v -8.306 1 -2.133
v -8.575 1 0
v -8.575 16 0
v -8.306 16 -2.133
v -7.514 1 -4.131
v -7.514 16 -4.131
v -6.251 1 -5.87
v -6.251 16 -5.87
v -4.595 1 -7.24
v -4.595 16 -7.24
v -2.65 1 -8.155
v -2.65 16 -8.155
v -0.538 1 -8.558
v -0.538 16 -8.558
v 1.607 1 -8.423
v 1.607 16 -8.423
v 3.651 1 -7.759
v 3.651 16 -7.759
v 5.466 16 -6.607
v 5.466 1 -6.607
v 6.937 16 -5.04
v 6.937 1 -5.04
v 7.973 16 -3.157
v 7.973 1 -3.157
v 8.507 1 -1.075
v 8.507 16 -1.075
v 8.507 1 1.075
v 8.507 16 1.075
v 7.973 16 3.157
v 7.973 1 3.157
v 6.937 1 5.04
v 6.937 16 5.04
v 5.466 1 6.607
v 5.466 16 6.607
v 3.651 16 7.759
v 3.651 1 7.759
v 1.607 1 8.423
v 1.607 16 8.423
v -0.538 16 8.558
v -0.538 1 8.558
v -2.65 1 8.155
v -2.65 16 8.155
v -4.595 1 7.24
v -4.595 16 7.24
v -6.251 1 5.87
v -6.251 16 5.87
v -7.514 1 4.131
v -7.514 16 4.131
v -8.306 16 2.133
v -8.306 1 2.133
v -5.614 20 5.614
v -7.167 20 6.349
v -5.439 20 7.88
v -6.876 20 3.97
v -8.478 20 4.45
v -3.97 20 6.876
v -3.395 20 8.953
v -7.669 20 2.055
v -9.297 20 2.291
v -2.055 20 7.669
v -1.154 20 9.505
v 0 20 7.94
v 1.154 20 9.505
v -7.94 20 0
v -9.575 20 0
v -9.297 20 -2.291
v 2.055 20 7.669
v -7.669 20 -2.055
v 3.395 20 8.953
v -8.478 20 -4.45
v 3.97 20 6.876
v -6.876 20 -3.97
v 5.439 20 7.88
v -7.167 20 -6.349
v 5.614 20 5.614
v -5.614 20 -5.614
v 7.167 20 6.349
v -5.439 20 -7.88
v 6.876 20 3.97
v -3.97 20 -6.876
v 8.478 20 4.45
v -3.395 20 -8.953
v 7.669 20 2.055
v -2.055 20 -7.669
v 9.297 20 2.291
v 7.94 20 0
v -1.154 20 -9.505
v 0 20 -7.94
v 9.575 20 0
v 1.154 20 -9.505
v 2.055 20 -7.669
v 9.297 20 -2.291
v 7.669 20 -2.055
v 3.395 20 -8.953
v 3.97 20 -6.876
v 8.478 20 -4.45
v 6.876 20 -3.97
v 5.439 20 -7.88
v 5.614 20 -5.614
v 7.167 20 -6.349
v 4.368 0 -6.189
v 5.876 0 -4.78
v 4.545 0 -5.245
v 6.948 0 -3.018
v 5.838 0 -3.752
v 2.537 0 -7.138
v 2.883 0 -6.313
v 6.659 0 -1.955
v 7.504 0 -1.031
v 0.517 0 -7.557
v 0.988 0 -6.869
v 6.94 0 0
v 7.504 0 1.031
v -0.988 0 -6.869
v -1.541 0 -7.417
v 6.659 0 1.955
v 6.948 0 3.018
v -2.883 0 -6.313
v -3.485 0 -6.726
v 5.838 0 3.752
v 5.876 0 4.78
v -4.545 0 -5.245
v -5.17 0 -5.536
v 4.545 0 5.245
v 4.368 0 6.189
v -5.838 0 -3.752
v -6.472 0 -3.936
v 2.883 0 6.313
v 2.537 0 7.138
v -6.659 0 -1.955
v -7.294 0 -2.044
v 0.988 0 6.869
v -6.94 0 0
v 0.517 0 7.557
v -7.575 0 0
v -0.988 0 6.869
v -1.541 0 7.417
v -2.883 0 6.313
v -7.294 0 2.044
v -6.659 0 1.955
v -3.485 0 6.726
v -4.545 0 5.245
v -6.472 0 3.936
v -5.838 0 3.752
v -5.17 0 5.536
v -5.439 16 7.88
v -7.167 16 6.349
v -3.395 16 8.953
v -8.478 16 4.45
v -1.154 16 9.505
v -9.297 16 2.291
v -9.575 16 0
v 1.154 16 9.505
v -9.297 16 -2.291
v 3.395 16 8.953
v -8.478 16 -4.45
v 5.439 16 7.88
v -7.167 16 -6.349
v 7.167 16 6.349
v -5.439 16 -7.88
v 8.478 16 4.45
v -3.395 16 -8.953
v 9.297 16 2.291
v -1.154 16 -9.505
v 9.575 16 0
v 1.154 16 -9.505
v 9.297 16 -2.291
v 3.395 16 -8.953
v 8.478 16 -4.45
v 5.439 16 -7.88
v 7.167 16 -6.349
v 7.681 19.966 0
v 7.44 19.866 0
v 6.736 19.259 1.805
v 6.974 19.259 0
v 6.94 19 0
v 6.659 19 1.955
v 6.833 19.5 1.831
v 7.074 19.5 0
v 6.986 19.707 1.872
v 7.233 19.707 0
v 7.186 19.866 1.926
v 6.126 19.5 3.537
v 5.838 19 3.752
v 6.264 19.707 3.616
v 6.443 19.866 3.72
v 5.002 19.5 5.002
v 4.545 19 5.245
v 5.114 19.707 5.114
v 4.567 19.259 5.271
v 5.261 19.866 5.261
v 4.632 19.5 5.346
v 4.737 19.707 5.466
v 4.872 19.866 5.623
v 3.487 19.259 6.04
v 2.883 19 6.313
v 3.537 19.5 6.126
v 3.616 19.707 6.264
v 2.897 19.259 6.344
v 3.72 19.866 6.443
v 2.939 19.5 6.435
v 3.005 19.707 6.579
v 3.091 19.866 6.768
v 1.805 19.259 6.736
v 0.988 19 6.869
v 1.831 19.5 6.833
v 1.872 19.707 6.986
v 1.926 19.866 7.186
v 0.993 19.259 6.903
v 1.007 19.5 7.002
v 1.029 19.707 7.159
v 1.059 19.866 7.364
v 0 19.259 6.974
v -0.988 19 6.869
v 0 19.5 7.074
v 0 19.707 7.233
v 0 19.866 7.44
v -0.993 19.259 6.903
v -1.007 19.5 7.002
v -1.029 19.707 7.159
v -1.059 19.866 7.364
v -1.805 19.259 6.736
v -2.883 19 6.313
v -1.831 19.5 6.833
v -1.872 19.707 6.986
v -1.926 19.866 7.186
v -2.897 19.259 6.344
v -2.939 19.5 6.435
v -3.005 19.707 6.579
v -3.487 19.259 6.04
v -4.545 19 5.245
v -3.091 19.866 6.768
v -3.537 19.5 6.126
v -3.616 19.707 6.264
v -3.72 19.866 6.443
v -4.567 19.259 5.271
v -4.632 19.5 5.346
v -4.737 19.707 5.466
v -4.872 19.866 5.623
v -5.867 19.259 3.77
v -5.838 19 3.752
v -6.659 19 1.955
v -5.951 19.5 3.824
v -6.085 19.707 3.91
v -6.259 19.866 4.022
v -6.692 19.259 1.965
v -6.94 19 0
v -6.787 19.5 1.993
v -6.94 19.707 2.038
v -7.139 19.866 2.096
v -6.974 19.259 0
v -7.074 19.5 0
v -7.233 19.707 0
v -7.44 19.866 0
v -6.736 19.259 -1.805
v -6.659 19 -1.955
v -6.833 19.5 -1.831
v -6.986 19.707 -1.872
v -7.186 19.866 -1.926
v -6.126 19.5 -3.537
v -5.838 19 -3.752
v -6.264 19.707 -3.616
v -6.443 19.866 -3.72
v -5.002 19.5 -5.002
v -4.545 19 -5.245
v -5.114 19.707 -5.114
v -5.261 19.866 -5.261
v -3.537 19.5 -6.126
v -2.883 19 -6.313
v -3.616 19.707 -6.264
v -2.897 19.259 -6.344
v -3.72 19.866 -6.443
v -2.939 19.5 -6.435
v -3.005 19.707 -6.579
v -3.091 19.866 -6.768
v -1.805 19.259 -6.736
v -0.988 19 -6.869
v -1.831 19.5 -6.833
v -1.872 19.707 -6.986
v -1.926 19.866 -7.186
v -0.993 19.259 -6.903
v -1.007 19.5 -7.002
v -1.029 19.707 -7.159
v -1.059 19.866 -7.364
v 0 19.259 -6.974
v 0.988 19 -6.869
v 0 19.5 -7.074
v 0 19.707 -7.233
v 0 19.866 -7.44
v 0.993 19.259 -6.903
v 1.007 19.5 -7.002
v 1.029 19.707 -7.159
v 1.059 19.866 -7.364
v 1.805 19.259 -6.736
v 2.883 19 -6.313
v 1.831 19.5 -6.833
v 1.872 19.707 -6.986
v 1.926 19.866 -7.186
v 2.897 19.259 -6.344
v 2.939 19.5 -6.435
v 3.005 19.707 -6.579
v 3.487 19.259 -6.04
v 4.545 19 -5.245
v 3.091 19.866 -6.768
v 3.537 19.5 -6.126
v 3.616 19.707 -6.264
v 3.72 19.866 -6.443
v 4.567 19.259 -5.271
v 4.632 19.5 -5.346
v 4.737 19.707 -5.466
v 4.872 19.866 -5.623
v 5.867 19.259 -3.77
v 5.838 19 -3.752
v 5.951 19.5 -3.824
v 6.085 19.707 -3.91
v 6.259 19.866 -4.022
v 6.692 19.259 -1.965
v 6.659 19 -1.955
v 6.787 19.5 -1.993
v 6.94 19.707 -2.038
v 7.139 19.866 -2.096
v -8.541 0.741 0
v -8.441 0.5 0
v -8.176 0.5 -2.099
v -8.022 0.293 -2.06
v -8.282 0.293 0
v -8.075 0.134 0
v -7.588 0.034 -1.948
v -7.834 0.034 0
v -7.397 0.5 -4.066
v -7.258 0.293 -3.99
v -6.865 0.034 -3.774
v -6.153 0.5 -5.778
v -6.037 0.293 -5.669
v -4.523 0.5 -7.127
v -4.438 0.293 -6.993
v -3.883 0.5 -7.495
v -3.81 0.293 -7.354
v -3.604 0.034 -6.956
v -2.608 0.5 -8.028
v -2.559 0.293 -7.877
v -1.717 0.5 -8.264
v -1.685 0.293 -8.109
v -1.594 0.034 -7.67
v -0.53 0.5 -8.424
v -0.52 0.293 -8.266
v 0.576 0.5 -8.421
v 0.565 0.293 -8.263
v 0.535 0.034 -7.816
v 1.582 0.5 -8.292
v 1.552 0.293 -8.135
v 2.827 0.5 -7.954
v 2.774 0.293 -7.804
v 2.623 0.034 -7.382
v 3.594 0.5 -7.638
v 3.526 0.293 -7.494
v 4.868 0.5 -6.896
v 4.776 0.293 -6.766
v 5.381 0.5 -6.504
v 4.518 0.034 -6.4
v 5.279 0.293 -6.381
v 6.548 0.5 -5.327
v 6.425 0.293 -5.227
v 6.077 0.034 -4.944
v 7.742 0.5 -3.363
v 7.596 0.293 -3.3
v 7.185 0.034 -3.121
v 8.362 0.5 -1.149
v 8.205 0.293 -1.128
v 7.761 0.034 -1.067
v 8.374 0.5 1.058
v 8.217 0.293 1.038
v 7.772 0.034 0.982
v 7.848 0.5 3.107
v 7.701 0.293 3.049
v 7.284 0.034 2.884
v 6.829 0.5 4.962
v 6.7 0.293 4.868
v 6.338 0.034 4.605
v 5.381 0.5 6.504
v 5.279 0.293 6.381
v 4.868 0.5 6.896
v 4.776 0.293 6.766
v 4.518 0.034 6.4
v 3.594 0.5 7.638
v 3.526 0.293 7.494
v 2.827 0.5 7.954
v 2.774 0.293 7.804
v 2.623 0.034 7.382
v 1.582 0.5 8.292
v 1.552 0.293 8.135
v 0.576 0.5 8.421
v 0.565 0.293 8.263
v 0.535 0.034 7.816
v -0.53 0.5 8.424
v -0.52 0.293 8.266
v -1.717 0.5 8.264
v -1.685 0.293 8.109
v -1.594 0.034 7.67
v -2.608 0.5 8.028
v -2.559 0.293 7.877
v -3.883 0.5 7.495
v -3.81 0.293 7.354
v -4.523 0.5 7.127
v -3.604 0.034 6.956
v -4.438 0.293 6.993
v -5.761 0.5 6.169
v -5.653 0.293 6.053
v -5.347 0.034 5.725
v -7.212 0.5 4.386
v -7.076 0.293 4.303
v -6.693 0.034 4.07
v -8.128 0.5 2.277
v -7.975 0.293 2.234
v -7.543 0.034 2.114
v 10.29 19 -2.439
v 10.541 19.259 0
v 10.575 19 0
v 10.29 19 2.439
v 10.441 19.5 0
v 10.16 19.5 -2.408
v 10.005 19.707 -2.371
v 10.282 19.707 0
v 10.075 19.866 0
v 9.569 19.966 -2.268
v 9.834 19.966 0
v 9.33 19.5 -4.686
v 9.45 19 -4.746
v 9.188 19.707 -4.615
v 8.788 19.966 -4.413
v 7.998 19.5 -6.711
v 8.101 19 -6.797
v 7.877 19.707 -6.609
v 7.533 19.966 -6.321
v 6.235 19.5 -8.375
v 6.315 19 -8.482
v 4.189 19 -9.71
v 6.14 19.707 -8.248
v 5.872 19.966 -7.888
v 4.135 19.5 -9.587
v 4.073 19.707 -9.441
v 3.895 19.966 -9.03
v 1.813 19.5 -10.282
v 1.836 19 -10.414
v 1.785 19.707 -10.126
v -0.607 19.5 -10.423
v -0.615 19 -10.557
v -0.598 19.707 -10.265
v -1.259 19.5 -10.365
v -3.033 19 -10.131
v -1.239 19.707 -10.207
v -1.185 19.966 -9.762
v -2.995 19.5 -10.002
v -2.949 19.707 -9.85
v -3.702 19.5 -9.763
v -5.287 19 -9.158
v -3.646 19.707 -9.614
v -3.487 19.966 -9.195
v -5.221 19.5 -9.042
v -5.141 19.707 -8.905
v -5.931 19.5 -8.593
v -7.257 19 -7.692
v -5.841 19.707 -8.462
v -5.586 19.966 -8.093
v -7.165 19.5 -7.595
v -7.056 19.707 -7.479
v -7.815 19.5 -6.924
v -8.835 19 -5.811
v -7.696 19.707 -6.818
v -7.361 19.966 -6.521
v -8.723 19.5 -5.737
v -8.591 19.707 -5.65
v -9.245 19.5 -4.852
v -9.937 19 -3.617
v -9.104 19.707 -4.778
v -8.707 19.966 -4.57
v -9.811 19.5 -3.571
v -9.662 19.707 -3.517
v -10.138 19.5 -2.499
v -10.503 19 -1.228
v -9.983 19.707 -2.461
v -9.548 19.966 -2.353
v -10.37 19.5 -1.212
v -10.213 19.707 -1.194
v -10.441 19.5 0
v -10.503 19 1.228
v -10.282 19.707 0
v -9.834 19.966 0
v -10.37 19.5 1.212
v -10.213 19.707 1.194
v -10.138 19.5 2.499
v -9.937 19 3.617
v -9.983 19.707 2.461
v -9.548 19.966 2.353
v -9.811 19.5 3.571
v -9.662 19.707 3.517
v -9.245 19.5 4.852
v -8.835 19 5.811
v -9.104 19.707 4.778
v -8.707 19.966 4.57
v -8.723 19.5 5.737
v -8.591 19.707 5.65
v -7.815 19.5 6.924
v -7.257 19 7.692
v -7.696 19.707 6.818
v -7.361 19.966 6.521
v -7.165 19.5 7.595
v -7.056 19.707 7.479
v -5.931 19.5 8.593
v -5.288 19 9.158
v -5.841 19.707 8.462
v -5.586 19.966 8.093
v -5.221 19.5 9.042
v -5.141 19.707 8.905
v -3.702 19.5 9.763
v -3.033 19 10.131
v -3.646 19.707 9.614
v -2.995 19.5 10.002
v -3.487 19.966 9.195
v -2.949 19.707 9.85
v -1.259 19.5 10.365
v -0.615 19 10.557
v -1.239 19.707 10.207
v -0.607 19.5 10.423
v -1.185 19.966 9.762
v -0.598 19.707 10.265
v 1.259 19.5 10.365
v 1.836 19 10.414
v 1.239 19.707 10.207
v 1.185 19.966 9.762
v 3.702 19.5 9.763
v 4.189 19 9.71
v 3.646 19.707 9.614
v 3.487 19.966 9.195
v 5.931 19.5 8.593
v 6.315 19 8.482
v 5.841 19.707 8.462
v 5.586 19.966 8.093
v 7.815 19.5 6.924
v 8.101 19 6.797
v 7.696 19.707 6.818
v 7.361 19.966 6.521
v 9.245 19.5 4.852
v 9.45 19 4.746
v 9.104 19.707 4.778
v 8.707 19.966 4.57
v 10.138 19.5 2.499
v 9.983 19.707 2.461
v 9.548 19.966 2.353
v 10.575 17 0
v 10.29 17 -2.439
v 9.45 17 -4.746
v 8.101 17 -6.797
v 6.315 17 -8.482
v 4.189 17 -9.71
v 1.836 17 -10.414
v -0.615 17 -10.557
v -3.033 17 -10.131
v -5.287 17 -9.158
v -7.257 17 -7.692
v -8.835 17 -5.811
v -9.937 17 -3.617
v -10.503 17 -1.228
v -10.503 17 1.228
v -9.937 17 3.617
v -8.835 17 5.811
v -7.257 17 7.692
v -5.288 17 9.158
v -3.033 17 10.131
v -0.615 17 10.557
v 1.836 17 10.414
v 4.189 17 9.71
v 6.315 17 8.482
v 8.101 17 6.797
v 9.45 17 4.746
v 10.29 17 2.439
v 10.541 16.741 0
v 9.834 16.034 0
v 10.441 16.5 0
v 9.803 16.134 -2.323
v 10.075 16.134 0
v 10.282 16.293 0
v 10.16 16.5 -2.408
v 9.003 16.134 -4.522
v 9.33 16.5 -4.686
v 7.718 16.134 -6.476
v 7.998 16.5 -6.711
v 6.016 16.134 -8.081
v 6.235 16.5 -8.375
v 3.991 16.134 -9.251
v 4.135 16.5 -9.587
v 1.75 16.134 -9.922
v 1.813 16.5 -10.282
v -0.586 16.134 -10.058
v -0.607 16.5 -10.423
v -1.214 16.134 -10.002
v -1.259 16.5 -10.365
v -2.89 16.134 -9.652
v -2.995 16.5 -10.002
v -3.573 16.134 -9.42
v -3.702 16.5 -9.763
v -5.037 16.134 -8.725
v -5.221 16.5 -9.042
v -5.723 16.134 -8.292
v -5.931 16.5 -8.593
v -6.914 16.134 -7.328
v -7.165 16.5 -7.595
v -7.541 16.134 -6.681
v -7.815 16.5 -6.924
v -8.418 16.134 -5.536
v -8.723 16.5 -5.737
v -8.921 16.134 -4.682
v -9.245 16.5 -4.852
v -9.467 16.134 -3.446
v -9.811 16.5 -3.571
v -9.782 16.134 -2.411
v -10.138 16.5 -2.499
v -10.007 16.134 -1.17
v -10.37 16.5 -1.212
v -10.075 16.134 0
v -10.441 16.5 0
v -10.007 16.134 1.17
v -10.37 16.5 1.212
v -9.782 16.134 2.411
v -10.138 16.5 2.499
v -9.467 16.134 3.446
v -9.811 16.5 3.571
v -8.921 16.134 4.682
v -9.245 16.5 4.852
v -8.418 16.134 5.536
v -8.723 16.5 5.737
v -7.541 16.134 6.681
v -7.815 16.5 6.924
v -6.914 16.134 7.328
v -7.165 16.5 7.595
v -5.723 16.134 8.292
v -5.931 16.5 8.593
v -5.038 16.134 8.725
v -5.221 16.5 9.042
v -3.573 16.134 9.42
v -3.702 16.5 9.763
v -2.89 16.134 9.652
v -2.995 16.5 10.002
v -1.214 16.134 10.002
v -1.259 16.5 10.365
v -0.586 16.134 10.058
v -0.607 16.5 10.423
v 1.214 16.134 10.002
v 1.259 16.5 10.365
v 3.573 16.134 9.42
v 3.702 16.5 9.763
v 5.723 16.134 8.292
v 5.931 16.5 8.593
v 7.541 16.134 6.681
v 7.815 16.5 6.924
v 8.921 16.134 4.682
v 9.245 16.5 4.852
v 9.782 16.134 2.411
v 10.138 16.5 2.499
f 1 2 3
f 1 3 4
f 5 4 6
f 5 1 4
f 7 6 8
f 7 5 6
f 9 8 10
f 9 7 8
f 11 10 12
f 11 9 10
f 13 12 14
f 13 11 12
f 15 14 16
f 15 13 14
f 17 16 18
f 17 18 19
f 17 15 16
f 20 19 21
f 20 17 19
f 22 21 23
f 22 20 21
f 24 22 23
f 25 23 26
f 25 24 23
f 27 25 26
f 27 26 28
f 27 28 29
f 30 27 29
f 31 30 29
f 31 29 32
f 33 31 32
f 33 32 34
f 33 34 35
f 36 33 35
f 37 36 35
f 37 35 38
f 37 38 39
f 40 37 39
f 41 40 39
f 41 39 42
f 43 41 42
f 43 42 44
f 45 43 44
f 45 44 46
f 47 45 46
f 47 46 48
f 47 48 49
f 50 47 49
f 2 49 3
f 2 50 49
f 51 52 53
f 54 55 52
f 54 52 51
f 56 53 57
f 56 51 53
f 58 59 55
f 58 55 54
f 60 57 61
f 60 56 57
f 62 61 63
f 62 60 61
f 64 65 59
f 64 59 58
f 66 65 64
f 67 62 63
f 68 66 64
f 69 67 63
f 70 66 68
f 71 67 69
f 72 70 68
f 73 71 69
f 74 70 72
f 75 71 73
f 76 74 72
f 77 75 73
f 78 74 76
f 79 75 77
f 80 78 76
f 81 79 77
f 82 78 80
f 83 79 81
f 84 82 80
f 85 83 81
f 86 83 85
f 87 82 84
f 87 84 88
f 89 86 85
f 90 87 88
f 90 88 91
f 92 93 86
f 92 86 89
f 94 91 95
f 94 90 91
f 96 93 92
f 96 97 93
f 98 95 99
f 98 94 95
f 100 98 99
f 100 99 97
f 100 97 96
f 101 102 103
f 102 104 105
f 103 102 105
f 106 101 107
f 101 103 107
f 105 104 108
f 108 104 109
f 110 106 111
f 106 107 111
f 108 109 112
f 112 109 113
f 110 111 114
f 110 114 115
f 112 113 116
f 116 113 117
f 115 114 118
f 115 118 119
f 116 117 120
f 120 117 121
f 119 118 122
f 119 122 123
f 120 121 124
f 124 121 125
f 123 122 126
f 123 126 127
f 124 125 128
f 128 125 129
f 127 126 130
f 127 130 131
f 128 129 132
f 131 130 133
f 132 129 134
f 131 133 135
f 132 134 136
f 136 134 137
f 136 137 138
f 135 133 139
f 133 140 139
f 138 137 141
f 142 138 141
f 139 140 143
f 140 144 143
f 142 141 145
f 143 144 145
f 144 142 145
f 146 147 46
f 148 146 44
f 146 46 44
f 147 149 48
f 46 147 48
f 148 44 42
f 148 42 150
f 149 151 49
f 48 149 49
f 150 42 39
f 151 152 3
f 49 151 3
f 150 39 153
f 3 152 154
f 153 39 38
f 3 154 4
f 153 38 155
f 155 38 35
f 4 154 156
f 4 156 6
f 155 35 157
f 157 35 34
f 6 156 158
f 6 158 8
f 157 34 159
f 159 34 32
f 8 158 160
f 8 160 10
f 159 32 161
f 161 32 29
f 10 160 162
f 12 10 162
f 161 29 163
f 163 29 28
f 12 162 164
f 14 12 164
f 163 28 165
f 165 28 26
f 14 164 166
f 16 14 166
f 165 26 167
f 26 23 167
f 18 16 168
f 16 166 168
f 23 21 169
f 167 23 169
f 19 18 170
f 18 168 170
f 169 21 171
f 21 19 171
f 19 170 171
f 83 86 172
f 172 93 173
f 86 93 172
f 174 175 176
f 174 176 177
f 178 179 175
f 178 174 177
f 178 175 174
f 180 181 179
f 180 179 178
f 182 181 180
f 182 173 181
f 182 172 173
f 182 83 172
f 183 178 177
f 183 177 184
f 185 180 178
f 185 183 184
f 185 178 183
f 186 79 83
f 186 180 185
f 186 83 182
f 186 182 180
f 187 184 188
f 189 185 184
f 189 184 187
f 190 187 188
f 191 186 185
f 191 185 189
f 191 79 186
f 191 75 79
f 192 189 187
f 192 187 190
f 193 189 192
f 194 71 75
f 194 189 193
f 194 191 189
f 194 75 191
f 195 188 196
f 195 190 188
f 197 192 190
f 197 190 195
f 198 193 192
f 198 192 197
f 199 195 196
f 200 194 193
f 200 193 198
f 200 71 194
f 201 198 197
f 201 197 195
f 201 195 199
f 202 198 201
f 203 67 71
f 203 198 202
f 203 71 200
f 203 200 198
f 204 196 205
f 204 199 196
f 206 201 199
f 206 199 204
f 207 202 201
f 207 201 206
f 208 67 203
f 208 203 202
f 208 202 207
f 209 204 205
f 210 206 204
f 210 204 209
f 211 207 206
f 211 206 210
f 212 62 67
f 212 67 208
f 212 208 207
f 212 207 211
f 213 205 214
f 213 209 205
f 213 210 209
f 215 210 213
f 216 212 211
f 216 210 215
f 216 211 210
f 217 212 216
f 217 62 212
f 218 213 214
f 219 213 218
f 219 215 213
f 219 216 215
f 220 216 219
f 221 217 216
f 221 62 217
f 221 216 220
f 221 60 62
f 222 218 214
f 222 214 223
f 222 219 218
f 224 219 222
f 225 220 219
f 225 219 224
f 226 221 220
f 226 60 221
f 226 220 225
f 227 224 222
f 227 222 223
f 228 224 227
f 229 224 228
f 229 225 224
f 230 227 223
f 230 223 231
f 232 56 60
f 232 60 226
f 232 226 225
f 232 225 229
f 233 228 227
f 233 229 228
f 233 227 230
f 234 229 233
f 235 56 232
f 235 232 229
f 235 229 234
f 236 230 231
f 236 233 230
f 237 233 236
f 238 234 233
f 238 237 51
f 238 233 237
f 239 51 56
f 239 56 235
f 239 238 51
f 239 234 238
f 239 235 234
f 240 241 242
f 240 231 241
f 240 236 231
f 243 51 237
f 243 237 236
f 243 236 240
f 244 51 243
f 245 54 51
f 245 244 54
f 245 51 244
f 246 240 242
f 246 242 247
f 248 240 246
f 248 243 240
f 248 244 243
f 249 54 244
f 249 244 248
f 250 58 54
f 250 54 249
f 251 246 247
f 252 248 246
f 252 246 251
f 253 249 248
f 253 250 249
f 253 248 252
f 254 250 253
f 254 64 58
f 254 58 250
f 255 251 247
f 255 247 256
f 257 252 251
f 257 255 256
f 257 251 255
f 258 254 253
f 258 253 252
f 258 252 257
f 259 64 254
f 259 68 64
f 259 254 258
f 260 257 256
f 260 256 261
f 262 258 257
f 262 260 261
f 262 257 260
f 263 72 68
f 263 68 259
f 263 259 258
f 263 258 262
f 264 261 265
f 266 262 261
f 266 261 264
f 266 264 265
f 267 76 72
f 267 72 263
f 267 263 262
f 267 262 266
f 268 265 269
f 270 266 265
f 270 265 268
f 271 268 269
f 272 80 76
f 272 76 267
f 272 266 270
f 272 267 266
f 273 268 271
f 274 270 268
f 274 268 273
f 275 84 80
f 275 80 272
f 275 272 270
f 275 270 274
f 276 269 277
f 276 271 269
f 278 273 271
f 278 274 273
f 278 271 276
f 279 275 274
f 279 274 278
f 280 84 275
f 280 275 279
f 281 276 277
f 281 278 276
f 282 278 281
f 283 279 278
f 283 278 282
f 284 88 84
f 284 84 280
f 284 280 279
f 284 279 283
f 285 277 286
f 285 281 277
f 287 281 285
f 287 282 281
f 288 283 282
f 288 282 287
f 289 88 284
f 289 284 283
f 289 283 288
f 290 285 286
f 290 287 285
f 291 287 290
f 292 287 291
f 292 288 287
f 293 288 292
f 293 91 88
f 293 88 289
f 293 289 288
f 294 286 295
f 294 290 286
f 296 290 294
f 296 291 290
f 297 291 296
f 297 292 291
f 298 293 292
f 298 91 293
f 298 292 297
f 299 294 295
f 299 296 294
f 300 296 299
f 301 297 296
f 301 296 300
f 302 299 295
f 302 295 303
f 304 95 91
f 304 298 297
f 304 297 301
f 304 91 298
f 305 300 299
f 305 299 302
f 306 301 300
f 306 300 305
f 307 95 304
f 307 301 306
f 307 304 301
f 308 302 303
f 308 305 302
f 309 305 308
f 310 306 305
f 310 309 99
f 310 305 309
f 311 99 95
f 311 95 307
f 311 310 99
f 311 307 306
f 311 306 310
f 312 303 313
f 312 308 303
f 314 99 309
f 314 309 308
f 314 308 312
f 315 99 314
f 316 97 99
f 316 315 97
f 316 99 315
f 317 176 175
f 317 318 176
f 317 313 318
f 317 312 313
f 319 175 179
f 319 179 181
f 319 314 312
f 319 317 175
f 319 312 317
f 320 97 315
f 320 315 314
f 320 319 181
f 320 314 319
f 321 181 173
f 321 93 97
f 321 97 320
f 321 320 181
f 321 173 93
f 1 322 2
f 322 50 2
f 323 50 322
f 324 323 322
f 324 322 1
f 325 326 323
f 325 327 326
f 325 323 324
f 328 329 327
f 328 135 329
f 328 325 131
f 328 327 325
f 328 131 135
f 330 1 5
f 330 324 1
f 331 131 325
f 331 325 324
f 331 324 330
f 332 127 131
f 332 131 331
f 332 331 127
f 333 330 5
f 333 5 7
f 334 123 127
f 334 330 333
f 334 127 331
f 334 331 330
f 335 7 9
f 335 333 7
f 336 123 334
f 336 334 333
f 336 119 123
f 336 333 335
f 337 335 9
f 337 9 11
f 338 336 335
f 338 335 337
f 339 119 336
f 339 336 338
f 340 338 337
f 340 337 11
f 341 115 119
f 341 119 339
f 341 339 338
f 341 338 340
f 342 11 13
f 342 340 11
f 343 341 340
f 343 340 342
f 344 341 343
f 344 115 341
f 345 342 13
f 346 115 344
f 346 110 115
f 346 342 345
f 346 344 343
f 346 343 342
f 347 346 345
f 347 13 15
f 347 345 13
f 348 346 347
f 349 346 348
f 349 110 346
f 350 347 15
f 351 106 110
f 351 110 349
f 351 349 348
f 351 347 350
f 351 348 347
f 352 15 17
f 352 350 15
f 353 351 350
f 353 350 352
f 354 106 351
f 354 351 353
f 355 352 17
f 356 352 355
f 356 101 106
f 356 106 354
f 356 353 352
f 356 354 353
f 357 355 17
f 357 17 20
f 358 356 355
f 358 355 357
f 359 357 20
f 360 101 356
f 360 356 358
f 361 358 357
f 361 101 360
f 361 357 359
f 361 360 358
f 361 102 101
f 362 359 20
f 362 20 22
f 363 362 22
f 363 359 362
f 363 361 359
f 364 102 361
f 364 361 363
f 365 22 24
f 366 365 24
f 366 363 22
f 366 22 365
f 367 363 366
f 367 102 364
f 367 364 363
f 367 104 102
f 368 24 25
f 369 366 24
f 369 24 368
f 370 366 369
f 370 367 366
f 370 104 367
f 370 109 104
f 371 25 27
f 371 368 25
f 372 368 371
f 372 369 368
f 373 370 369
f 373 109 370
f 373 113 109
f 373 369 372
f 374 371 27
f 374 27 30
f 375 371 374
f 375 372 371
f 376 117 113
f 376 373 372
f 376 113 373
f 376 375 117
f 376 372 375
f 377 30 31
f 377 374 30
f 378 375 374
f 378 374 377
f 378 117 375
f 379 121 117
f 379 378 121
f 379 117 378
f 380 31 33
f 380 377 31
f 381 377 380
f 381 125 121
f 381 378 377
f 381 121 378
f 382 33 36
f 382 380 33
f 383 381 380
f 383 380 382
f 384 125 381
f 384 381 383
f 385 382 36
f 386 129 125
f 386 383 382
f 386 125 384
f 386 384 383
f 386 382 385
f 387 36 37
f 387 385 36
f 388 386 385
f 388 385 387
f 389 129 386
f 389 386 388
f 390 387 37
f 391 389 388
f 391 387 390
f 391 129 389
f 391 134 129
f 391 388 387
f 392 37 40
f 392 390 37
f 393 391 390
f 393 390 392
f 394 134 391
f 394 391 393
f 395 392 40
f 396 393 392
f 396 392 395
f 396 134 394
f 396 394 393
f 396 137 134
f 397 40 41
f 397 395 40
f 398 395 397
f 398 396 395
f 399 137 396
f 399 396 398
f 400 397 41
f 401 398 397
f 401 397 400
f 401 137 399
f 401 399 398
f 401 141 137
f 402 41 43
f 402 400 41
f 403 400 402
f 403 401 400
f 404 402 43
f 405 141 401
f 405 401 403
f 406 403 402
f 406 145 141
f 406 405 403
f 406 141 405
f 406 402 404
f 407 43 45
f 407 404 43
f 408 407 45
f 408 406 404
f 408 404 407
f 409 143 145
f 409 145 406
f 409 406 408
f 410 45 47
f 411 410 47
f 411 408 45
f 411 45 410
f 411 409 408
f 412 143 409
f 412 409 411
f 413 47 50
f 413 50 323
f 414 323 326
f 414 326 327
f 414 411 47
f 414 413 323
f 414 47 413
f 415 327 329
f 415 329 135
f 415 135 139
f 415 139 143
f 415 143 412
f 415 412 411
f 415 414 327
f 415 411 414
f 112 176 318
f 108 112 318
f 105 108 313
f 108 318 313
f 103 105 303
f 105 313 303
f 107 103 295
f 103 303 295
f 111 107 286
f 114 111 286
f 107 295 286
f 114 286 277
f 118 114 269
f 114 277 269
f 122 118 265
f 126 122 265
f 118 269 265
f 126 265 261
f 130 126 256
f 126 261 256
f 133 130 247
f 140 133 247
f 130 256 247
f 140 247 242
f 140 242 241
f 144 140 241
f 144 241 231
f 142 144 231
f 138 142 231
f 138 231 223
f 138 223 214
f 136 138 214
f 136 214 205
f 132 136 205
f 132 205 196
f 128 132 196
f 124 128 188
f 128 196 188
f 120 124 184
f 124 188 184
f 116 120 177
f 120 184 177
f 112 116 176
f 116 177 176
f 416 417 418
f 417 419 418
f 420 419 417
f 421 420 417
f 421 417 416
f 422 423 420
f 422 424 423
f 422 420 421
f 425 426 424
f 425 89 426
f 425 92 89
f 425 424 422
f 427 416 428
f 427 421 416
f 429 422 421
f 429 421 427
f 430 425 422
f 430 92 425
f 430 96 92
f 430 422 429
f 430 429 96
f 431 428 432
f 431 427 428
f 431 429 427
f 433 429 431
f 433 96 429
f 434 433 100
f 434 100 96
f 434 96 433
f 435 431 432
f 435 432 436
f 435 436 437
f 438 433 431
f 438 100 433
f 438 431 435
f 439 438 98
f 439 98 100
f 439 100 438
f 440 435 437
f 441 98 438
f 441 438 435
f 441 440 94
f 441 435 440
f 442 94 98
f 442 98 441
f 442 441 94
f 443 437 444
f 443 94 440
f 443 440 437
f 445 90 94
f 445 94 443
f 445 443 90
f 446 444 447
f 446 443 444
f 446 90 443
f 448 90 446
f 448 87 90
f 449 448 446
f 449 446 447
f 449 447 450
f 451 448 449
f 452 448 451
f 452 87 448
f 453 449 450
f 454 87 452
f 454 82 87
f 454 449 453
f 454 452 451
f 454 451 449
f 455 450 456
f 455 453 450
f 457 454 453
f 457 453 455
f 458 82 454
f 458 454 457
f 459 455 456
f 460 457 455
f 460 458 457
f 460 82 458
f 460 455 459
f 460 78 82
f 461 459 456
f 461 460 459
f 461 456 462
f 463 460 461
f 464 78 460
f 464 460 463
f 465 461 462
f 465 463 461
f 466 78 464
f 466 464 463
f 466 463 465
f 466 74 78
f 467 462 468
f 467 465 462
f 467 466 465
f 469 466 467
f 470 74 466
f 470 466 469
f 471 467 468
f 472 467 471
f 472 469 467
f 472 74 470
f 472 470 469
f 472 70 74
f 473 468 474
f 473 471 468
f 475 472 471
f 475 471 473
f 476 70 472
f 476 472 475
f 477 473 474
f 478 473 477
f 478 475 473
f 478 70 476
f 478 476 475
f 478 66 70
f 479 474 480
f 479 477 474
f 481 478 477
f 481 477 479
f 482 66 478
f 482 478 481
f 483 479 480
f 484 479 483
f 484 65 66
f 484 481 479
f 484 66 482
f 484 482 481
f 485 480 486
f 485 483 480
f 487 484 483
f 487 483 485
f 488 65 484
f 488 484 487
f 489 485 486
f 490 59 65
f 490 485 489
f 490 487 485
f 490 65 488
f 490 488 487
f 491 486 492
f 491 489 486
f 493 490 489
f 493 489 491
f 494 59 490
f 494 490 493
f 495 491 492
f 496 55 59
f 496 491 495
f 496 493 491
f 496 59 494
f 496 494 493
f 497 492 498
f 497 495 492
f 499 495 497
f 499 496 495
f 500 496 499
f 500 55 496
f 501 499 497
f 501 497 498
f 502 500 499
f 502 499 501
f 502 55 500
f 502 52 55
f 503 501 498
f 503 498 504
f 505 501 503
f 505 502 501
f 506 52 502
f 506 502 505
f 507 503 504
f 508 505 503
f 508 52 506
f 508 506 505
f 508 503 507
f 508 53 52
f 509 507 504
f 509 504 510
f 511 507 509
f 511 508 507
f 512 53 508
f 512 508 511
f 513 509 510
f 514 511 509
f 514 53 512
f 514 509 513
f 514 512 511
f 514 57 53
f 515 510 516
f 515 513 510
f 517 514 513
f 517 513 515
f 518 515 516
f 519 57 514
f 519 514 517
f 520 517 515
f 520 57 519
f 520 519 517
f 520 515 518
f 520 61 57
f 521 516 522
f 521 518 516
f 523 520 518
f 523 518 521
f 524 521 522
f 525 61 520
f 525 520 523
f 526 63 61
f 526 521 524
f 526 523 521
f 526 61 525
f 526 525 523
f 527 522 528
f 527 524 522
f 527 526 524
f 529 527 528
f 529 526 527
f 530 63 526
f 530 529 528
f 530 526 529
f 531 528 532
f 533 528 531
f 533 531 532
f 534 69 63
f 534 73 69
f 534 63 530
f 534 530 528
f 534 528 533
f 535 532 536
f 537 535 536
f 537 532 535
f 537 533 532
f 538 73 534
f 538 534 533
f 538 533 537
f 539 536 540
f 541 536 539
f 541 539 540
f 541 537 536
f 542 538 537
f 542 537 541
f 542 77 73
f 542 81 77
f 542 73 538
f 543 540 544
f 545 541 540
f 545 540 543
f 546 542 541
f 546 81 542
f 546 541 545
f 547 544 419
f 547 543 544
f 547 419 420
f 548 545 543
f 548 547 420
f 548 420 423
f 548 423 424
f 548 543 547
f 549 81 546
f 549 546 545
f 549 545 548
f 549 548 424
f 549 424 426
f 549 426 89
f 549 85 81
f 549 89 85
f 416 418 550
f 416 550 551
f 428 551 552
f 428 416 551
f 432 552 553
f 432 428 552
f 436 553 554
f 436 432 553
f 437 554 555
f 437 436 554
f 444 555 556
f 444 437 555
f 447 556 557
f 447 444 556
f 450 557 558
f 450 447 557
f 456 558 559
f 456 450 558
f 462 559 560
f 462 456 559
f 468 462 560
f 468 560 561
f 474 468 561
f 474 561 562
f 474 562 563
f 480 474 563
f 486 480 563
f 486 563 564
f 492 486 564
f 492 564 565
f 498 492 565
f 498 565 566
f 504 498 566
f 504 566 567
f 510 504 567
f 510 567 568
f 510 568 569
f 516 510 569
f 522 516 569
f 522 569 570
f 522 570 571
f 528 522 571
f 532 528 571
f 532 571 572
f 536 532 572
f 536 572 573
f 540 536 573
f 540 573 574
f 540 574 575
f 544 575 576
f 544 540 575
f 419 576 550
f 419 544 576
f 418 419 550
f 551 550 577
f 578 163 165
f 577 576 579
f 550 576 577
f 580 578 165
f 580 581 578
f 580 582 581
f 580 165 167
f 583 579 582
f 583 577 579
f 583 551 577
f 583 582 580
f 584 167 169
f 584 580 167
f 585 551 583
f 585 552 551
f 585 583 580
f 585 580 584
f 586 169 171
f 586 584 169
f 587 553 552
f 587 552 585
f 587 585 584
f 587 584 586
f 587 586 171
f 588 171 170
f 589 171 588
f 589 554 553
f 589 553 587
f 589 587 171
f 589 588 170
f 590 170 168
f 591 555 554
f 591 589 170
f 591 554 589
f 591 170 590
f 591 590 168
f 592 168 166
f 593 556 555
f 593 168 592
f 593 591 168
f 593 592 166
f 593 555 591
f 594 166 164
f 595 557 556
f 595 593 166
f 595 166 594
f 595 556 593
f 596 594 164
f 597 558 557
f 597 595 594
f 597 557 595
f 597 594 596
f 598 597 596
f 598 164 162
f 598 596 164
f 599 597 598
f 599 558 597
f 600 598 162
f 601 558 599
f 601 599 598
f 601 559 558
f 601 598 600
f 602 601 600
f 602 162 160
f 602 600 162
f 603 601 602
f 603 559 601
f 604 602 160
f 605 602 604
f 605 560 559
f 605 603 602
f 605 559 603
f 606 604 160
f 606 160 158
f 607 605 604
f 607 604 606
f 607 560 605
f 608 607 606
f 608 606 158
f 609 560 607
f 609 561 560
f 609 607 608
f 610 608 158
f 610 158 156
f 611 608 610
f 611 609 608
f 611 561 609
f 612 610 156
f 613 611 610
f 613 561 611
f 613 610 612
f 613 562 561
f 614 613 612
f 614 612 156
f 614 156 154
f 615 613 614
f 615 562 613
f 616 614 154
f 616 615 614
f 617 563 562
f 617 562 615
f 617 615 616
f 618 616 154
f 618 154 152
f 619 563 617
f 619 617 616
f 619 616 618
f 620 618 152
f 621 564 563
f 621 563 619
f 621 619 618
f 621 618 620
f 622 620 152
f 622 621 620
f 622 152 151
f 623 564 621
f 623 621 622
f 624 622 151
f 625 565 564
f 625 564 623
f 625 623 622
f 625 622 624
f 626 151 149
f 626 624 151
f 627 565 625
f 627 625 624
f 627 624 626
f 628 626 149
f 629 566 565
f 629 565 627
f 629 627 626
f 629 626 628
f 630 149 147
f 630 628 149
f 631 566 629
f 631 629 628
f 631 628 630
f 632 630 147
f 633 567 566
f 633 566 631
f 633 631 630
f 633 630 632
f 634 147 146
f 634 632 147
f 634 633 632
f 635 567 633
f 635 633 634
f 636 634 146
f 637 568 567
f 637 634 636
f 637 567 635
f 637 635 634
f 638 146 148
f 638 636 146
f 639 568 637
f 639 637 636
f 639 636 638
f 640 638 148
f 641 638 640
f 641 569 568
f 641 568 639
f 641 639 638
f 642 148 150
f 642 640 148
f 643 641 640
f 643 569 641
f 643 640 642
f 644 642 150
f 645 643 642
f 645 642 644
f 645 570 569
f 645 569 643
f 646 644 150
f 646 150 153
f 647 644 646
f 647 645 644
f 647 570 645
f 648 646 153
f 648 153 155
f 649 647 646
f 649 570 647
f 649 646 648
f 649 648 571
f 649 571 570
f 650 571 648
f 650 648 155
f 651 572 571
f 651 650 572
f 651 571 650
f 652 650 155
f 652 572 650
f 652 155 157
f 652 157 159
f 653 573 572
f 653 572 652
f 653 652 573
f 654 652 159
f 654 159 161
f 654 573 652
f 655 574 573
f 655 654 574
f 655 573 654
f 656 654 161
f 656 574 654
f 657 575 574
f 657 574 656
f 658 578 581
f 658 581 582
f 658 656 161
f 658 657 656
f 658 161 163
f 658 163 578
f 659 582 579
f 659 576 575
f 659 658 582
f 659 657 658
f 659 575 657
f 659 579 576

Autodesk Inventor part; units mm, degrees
ref_plane "YZ Plane" through (0, 0, 0) normal (1, 0, 0) x (0, 1, 0)
ref_plane "XZ Plane" through (0, 0, 0) normal (0, 1, 0) x (-1, 0, 0)
ref_plane "XY Plane" through (0, 0, 0) normal (0, 0, 1) x (1, 0, 0)
sketch "Sketch1" plane through (0, 0, 0) normal (0, 1, 0) x (-1, 0, 0)
  circle A0 centre (0, 0) radius 8.575
extrude "Extrusion1" add sketch "Sketch1" along normal blind 20
sketch "Sketch2" plane through (0, 20, 0) normal (0, 1, 0) x (1, 0, 0)
  circle A0 centre (0, 0) radius 8.575 projected
  circle A1 centre (0, 0) radius 10.575
extrude "Extrusion2" add sketch "Sketch2" against normal blind 4
sketch "Sketch3" plane through (0, 20, 0) normal (0, 1, 0) x (1, 0, 0)
  circle A0 centre (0, 0) radius 10.575 projected
  circle A1 centre (0, 0) radius 6.94
extrude "Extrusion3" cut sketch "Sketch3" against normal through all contours A1
fillet "Fillet1" radius 1 4 edges at (-10.575, 20, 0) (-6.94, 20, 0) (-10.575, 16, 0) (8.575, 0, 0)
properties part number "flaskPort"
